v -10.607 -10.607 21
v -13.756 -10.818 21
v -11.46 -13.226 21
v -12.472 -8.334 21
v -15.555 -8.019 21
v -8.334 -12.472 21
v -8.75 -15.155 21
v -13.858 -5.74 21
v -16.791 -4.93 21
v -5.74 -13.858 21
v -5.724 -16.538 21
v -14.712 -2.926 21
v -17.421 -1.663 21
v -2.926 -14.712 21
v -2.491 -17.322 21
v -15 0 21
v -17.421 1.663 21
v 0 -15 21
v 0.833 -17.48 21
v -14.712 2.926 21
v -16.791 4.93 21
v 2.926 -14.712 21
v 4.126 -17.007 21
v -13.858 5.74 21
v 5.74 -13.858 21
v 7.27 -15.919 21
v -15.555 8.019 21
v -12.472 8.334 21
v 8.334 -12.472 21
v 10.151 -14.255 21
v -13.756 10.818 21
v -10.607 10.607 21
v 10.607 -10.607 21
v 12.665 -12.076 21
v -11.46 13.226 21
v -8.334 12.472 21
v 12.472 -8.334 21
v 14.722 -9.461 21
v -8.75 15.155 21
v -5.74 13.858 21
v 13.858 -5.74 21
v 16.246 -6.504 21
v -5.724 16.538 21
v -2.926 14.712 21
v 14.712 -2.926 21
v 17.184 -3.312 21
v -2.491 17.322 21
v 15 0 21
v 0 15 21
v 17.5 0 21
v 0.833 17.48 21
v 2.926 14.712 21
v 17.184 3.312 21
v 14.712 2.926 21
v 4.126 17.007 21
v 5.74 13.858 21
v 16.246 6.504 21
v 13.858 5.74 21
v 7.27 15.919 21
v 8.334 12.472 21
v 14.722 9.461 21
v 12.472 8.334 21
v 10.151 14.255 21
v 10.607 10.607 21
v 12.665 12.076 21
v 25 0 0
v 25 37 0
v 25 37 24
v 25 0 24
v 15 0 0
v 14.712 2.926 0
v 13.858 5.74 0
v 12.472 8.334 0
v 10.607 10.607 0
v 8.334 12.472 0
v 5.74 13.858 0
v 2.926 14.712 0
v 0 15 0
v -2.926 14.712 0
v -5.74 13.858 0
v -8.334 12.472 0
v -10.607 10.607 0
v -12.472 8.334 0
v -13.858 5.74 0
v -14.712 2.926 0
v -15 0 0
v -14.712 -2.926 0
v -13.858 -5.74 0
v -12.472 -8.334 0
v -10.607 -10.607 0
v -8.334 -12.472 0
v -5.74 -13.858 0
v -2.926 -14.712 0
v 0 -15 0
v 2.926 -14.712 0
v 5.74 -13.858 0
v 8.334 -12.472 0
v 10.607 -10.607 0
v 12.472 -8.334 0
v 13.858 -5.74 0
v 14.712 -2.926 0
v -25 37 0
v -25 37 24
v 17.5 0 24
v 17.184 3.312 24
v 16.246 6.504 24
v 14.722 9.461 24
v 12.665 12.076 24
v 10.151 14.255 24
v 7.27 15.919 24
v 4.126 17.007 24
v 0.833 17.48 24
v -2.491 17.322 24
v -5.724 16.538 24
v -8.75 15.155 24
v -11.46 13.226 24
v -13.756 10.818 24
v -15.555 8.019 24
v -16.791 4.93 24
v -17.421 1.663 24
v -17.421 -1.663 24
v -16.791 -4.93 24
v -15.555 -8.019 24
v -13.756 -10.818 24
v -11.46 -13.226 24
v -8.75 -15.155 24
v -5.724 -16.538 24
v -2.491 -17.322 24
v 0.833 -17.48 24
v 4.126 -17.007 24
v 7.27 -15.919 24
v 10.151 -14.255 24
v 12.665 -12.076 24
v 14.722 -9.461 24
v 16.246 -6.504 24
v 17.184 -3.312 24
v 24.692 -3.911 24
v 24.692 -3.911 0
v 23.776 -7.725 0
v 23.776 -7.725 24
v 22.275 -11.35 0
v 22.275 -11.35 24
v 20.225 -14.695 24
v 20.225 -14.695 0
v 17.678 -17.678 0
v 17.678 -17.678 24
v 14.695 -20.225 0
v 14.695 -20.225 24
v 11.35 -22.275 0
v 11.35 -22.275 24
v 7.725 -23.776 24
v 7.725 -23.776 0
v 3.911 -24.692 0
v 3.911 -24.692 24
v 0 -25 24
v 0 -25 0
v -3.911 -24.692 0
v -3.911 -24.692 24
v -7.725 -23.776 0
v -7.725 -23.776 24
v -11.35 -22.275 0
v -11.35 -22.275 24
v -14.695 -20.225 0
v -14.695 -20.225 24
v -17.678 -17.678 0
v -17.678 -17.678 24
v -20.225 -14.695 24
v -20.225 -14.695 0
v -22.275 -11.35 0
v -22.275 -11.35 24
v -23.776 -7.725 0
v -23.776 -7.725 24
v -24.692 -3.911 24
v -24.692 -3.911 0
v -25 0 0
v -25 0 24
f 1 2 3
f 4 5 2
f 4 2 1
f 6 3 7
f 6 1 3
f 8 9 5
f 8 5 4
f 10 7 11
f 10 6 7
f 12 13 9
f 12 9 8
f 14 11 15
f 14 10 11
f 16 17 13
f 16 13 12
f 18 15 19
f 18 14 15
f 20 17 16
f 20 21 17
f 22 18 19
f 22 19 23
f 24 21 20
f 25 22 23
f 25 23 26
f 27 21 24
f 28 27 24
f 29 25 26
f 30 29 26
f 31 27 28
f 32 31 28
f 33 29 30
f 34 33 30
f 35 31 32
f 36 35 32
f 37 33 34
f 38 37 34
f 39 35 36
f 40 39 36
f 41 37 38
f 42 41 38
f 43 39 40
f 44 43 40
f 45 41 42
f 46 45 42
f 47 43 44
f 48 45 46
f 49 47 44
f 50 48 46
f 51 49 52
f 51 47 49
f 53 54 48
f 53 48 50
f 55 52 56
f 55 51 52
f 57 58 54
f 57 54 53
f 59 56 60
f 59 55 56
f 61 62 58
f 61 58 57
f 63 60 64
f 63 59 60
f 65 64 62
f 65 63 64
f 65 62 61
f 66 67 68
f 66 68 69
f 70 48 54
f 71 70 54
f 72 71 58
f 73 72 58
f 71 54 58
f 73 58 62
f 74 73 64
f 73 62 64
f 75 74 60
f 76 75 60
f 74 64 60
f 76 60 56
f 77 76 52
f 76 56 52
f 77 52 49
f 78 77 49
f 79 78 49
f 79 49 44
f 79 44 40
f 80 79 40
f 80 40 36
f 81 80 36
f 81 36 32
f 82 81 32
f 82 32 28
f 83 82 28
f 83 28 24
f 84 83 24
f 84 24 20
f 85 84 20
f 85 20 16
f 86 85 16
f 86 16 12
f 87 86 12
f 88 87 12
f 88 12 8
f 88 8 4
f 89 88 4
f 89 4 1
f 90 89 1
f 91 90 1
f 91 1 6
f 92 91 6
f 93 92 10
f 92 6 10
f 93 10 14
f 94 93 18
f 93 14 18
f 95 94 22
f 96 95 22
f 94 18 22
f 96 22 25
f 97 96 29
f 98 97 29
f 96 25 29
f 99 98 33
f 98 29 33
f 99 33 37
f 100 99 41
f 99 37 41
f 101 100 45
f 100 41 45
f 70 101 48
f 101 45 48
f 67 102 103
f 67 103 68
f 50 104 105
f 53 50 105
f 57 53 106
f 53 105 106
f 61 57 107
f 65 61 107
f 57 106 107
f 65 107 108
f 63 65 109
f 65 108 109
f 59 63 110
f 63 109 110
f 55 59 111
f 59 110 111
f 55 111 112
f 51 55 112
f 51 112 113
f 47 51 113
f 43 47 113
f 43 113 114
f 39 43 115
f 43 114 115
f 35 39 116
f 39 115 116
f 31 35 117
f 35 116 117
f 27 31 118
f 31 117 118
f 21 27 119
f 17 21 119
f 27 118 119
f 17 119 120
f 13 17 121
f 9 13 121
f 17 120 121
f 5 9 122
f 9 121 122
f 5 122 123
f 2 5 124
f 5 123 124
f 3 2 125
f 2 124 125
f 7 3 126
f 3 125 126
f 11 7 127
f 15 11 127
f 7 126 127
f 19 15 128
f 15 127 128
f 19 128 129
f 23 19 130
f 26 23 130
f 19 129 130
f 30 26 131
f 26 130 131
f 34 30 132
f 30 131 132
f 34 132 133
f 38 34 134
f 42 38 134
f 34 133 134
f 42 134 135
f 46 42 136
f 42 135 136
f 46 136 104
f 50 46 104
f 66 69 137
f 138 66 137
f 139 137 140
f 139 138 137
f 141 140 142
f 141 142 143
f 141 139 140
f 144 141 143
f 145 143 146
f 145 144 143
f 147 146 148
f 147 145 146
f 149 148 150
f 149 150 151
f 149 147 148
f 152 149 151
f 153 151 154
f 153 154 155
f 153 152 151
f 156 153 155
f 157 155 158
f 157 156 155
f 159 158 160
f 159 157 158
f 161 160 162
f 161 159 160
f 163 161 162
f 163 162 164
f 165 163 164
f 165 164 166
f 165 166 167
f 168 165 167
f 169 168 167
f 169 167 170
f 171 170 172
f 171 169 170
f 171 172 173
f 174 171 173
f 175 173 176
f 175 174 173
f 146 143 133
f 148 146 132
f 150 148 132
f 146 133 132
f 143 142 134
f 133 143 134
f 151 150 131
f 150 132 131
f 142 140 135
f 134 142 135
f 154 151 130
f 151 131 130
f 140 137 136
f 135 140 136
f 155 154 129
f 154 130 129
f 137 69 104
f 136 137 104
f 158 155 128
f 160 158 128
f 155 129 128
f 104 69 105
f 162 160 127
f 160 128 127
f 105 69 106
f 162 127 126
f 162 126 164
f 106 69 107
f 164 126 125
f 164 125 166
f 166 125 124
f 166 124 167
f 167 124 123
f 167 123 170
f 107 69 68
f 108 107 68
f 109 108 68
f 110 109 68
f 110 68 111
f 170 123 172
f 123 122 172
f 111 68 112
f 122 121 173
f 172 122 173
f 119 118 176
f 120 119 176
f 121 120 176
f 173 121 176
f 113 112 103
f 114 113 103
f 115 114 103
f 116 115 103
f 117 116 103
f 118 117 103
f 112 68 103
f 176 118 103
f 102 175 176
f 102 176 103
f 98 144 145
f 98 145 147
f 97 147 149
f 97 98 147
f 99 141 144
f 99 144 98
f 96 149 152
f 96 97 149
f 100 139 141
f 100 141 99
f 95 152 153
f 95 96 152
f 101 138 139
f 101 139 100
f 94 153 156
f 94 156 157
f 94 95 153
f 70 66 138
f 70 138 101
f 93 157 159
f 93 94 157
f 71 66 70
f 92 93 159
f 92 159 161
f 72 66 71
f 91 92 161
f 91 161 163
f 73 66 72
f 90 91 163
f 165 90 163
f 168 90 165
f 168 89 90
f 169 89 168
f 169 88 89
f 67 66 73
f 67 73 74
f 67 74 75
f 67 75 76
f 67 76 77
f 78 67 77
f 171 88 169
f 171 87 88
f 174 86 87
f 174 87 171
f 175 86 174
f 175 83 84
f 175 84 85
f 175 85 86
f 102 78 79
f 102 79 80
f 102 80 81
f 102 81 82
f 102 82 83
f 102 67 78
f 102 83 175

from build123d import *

# Parameters (mm, degrees)
EXTRUDE_1_DEPTH     = 24
SKETCH_2_R          = 17.5
CUT_EXTRUDE_1_DEPTH = 3
CUT_EXTRUDE_2_REACH = 51.346
SKETCH_3_R          = 15


with BuildPart() as part:
    # 草图1 → 凸台-拉伸1 (new body)
    with BuildSketch(Plane.XY):
        with BuildLine():
            Line((-25, 0), (-25, 37))
            Line((-25, 37), (25, 37))
            Line((25, 37), (25, 0))
            ThreePointArc((25, 0), (0, -25), (-25, 0))
        make_face()
    extrude(amount=EXTRUDE_1_DEPTH)

    # 草图2 → 切除-拉伸1 (cut)
    with BuildSketch(Plane.XY.offset(24)):
        Circle(SKETCH_2_R)
    extrude(amount=-CUT_EXTRUDE_1_DEPTH, mode=Mode.SUBTRACT)

    # 草图3 → 切除-拉伸2 (cut, up to next)
    with BuildSketch(Plane.XY.offset(21), mode=Mode.PRIVATE) as cut_extrude_2_sk1:
        Circle(SKETCH_3_R)
    cut_extrude_2_tool1 = extrude(cut_extrude_2_sk1.sketch, amount=-CUT_EXTRUDE_2_REACH, mode=Mode.PRIVATE) & part.part
    add(cut_extrude_2_tool1.solids().sort_by_distance((0, 0, 21))[0], mode=Mode.SUBTRACT)


solid = part.part
